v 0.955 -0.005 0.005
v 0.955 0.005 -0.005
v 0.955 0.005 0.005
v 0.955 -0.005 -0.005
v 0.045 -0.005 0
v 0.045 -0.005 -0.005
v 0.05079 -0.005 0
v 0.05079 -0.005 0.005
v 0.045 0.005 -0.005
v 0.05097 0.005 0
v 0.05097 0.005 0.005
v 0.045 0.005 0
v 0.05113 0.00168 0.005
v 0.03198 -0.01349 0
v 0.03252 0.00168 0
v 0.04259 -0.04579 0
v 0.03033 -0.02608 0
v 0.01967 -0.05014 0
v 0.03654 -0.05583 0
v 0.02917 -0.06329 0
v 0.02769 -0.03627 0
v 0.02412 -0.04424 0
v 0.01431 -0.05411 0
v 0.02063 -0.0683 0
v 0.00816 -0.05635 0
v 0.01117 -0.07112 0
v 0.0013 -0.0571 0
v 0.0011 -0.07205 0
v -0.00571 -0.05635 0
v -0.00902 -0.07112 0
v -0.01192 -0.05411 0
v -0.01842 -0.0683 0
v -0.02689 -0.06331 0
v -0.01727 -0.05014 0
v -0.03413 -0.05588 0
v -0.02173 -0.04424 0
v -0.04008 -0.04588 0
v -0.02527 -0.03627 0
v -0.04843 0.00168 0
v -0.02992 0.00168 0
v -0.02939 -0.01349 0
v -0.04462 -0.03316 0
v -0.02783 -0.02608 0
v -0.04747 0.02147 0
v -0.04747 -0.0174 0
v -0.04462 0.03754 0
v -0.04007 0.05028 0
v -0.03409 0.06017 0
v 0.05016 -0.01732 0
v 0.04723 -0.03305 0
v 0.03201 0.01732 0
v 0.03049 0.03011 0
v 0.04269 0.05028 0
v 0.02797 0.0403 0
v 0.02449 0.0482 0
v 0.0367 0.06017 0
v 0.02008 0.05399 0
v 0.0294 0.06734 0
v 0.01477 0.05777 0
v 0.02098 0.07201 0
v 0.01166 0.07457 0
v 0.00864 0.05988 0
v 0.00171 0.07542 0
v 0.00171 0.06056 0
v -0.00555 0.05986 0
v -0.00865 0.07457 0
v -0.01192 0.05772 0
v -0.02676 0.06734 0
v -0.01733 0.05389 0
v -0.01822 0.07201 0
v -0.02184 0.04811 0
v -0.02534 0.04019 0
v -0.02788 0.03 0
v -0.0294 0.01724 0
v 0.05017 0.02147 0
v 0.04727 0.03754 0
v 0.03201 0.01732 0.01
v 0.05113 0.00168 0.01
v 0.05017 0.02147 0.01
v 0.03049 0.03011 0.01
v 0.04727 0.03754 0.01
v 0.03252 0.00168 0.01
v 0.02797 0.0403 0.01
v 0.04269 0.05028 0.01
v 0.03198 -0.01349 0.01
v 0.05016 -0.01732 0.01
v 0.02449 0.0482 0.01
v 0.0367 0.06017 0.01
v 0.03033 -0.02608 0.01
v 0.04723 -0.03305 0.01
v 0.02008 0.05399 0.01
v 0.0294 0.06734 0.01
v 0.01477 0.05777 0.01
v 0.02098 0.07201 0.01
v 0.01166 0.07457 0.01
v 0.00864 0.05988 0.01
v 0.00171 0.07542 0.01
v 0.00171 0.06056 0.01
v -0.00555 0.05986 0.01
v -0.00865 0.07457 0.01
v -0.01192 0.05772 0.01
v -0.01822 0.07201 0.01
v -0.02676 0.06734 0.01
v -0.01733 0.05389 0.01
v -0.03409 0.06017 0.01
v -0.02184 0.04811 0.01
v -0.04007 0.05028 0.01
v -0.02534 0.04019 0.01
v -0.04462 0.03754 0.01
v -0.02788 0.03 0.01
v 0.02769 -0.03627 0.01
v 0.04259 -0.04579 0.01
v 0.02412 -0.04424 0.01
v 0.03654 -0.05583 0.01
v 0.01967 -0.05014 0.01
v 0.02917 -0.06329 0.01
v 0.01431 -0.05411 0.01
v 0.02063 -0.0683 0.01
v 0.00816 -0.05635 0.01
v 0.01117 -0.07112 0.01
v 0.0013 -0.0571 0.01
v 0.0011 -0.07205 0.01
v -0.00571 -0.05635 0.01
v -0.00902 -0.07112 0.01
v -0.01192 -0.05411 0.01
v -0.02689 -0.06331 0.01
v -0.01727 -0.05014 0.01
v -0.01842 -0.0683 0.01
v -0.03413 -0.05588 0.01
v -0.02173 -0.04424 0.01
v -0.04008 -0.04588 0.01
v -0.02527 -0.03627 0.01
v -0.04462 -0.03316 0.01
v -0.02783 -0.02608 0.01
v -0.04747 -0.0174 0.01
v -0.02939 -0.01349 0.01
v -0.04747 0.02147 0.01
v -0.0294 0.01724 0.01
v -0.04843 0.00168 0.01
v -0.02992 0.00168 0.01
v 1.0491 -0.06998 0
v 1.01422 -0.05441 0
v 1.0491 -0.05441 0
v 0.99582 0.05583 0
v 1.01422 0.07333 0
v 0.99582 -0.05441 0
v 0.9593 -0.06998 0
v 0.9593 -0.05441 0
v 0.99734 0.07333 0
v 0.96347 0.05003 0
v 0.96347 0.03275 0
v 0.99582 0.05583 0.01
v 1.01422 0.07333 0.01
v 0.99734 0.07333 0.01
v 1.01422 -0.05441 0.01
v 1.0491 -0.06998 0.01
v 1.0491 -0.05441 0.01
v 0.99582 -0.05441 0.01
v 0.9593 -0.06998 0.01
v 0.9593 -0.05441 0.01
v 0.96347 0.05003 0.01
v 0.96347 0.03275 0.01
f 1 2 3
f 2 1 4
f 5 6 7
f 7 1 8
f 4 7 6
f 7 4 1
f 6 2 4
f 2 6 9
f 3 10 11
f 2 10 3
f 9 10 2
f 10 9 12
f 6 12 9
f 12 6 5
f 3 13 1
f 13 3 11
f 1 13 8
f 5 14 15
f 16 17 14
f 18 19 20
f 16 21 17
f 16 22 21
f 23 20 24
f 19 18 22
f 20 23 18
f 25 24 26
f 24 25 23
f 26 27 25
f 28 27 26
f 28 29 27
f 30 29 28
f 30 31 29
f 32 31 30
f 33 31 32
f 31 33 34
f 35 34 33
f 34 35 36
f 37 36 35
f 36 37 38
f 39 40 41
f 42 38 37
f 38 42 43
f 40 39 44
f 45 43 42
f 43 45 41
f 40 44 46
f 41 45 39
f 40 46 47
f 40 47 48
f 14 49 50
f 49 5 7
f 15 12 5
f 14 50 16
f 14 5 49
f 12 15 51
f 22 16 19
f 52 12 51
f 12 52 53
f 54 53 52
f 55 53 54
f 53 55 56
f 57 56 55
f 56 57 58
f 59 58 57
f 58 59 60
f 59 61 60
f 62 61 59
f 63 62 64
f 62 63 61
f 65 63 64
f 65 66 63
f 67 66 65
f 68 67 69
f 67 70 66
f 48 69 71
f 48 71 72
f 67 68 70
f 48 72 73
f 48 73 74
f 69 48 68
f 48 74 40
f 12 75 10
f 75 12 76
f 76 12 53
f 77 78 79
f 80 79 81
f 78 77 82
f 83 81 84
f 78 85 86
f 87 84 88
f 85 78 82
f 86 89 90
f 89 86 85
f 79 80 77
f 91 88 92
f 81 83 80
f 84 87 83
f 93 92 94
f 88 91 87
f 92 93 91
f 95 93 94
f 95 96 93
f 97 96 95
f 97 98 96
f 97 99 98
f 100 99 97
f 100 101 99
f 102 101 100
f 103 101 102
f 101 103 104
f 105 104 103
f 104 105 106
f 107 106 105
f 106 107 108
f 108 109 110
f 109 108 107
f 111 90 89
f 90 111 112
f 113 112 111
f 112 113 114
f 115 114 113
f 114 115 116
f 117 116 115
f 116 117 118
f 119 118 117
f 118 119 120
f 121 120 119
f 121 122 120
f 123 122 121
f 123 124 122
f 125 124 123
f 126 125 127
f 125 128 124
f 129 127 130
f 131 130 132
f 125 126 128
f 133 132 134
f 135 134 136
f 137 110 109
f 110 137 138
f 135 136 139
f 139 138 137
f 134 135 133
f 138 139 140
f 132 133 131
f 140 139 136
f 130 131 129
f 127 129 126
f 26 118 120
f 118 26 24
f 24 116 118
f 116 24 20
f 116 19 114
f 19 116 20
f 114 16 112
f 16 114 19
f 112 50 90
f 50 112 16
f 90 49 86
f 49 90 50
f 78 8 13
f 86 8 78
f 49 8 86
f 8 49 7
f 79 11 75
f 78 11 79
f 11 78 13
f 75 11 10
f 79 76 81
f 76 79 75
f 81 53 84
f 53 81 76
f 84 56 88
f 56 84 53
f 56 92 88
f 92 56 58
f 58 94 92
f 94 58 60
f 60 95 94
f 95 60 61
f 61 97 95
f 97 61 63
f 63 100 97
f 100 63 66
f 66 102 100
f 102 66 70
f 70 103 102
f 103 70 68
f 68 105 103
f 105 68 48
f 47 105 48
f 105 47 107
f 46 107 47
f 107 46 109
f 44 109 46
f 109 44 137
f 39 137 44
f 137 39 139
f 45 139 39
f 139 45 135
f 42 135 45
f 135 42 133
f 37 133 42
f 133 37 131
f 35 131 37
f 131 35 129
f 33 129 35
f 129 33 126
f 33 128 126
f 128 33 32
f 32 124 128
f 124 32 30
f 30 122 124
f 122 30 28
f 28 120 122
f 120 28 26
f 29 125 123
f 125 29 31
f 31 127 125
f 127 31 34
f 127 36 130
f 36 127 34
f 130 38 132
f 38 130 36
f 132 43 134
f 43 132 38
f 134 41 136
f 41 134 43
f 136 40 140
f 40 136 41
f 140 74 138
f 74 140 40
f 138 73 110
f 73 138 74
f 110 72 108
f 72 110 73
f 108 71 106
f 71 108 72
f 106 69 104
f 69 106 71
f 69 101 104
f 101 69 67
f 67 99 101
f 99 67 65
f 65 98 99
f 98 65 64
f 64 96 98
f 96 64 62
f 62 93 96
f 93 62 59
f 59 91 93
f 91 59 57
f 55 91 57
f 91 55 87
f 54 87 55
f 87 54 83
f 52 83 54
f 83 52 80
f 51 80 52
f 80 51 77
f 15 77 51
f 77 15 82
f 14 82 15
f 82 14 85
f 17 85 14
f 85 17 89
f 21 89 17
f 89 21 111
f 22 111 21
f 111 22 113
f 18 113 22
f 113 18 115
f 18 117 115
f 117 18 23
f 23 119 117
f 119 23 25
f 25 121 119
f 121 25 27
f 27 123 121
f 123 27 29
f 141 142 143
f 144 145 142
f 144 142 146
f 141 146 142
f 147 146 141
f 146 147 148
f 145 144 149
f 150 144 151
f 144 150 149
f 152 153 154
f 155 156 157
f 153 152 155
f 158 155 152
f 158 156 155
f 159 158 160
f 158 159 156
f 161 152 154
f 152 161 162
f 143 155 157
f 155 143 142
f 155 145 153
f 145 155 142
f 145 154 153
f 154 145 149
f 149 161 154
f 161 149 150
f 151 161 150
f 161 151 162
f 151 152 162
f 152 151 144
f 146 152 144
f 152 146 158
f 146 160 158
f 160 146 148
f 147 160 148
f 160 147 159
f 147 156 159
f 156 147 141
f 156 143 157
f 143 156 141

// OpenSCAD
hull() {
    translate([0.05, 0.0, 0]) cube([0.01, 0.01, 0.01], center=true);
    translate([0.9500000000000001, 0.0, 0]) cube([0.01, 0.01, 0.01], center=true);
}


translate([0, 0, 0]) linear_extrude(0.01) text("0",size=0.15, halign="center", valign="center");

translate([1, 0, 0]) linear_extrude(0.01) text("1",size=0.15, halign="center", valign="center");
